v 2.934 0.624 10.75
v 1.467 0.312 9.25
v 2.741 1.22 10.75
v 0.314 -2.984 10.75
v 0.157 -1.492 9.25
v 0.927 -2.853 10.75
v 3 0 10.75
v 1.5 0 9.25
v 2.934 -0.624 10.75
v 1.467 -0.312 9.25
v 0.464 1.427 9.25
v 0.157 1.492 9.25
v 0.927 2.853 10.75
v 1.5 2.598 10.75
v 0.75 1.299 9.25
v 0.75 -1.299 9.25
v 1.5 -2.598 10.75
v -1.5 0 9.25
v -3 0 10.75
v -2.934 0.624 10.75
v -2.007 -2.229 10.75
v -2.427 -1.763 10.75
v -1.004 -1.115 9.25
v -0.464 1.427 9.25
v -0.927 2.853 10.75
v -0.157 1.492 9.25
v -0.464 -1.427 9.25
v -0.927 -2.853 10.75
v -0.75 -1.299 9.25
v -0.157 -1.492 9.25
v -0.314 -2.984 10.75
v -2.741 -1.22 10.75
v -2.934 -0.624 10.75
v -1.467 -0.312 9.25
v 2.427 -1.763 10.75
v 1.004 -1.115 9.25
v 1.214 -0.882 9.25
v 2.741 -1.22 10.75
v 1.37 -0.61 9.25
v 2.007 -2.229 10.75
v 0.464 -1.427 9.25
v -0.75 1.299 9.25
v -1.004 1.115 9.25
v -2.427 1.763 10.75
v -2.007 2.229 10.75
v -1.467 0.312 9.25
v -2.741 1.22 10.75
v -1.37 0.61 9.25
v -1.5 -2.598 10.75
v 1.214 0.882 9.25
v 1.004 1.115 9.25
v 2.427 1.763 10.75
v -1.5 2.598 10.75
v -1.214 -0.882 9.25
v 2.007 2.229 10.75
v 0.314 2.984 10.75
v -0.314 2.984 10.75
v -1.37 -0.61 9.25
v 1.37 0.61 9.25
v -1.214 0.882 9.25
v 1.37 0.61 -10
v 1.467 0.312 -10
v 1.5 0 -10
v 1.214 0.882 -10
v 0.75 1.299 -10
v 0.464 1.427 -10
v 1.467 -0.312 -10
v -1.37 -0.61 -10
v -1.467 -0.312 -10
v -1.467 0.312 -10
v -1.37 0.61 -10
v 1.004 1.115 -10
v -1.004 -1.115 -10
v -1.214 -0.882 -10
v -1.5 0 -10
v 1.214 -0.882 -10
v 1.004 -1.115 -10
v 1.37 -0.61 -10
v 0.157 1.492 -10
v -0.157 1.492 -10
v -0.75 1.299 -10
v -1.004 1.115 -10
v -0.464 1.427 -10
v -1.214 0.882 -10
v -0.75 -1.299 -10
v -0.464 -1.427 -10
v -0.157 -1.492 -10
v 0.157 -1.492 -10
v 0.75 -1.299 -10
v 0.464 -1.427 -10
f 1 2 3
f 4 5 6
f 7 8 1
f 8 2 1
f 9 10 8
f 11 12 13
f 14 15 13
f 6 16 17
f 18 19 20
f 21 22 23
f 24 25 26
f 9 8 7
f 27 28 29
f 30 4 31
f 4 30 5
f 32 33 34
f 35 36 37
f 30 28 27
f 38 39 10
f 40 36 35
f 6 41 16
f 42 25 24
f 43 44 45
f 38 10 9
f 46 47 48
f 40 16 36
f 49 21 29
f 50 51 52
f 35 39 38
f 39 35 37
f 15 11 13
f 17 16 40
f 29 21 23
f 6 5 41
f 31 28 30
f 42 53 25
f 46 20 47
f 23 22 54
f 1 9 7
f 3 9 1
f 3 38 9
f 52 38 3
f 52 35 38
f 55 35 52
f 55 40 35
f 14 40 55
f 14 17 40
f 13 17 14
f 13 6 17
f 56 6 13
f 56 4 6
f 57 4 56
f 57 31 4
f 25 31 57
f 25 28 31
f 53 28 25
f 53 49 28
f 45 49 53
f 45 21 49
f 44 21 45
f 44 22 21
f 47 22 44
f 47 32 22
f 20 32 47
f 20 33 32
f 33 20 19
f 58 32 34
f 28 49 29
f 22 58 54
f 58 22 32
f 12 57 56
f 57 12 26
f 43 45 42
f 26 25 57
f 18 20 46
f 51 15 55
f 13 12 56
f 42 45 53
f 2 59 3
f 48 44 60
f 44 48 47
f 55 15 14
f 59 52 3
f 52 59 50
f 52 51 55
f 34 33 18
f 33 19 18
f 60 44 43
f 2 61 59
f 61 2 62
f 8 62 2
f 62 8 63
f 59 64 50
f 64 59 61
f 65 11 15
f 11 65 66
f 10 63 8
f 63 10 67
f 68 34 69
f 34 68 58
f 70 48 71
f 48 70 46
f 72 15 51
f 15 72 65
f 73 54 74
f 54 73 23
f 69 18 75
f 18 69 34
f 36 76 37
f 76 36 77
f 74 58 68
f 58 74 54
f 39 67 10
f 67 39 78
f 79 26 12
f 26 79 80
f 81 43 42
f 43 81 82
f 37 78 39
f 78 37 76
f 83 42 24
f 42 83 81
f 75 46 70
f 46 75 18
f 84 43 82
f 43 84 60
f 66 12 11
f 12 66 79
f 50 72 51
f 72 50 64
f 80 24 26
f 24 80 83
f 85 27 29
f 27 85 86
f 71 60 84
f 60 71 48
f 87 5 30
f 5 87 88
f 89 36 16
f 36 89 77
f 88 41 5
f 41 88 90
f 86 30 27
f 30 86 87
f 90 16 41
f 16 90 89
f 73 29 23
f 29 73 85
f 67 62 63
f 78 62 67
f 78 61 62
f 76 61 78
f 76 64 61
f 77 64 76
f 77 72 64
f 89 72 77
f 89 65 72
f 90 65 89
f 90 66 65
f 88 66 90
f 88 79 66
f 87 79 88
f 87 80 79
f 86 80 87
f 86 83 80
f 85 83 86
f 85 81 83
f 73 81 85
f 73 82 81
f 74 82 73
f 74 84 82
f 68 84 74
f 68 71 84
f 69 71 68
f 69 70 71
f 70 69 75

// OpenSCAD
/* [Screw] */

diamScrew=3; // [1:14]
diamScrewHead=6; // [2:20]
heightScrew=20; // [5:100]
heightScrewHead=1.5; // [1:20]
screwHead = 30; // [4:60]

color("yellow")
  translate([0,0,heightScrew/2]) 
  cylinder( r1=diamScrew/2, r2=diamScrewHead/2, heightScrewHead, $fn=screwHead, center=true);
       color("yellow") cylinder(r=diamScrew/2, heightScrew, $fn=30, center=true);
